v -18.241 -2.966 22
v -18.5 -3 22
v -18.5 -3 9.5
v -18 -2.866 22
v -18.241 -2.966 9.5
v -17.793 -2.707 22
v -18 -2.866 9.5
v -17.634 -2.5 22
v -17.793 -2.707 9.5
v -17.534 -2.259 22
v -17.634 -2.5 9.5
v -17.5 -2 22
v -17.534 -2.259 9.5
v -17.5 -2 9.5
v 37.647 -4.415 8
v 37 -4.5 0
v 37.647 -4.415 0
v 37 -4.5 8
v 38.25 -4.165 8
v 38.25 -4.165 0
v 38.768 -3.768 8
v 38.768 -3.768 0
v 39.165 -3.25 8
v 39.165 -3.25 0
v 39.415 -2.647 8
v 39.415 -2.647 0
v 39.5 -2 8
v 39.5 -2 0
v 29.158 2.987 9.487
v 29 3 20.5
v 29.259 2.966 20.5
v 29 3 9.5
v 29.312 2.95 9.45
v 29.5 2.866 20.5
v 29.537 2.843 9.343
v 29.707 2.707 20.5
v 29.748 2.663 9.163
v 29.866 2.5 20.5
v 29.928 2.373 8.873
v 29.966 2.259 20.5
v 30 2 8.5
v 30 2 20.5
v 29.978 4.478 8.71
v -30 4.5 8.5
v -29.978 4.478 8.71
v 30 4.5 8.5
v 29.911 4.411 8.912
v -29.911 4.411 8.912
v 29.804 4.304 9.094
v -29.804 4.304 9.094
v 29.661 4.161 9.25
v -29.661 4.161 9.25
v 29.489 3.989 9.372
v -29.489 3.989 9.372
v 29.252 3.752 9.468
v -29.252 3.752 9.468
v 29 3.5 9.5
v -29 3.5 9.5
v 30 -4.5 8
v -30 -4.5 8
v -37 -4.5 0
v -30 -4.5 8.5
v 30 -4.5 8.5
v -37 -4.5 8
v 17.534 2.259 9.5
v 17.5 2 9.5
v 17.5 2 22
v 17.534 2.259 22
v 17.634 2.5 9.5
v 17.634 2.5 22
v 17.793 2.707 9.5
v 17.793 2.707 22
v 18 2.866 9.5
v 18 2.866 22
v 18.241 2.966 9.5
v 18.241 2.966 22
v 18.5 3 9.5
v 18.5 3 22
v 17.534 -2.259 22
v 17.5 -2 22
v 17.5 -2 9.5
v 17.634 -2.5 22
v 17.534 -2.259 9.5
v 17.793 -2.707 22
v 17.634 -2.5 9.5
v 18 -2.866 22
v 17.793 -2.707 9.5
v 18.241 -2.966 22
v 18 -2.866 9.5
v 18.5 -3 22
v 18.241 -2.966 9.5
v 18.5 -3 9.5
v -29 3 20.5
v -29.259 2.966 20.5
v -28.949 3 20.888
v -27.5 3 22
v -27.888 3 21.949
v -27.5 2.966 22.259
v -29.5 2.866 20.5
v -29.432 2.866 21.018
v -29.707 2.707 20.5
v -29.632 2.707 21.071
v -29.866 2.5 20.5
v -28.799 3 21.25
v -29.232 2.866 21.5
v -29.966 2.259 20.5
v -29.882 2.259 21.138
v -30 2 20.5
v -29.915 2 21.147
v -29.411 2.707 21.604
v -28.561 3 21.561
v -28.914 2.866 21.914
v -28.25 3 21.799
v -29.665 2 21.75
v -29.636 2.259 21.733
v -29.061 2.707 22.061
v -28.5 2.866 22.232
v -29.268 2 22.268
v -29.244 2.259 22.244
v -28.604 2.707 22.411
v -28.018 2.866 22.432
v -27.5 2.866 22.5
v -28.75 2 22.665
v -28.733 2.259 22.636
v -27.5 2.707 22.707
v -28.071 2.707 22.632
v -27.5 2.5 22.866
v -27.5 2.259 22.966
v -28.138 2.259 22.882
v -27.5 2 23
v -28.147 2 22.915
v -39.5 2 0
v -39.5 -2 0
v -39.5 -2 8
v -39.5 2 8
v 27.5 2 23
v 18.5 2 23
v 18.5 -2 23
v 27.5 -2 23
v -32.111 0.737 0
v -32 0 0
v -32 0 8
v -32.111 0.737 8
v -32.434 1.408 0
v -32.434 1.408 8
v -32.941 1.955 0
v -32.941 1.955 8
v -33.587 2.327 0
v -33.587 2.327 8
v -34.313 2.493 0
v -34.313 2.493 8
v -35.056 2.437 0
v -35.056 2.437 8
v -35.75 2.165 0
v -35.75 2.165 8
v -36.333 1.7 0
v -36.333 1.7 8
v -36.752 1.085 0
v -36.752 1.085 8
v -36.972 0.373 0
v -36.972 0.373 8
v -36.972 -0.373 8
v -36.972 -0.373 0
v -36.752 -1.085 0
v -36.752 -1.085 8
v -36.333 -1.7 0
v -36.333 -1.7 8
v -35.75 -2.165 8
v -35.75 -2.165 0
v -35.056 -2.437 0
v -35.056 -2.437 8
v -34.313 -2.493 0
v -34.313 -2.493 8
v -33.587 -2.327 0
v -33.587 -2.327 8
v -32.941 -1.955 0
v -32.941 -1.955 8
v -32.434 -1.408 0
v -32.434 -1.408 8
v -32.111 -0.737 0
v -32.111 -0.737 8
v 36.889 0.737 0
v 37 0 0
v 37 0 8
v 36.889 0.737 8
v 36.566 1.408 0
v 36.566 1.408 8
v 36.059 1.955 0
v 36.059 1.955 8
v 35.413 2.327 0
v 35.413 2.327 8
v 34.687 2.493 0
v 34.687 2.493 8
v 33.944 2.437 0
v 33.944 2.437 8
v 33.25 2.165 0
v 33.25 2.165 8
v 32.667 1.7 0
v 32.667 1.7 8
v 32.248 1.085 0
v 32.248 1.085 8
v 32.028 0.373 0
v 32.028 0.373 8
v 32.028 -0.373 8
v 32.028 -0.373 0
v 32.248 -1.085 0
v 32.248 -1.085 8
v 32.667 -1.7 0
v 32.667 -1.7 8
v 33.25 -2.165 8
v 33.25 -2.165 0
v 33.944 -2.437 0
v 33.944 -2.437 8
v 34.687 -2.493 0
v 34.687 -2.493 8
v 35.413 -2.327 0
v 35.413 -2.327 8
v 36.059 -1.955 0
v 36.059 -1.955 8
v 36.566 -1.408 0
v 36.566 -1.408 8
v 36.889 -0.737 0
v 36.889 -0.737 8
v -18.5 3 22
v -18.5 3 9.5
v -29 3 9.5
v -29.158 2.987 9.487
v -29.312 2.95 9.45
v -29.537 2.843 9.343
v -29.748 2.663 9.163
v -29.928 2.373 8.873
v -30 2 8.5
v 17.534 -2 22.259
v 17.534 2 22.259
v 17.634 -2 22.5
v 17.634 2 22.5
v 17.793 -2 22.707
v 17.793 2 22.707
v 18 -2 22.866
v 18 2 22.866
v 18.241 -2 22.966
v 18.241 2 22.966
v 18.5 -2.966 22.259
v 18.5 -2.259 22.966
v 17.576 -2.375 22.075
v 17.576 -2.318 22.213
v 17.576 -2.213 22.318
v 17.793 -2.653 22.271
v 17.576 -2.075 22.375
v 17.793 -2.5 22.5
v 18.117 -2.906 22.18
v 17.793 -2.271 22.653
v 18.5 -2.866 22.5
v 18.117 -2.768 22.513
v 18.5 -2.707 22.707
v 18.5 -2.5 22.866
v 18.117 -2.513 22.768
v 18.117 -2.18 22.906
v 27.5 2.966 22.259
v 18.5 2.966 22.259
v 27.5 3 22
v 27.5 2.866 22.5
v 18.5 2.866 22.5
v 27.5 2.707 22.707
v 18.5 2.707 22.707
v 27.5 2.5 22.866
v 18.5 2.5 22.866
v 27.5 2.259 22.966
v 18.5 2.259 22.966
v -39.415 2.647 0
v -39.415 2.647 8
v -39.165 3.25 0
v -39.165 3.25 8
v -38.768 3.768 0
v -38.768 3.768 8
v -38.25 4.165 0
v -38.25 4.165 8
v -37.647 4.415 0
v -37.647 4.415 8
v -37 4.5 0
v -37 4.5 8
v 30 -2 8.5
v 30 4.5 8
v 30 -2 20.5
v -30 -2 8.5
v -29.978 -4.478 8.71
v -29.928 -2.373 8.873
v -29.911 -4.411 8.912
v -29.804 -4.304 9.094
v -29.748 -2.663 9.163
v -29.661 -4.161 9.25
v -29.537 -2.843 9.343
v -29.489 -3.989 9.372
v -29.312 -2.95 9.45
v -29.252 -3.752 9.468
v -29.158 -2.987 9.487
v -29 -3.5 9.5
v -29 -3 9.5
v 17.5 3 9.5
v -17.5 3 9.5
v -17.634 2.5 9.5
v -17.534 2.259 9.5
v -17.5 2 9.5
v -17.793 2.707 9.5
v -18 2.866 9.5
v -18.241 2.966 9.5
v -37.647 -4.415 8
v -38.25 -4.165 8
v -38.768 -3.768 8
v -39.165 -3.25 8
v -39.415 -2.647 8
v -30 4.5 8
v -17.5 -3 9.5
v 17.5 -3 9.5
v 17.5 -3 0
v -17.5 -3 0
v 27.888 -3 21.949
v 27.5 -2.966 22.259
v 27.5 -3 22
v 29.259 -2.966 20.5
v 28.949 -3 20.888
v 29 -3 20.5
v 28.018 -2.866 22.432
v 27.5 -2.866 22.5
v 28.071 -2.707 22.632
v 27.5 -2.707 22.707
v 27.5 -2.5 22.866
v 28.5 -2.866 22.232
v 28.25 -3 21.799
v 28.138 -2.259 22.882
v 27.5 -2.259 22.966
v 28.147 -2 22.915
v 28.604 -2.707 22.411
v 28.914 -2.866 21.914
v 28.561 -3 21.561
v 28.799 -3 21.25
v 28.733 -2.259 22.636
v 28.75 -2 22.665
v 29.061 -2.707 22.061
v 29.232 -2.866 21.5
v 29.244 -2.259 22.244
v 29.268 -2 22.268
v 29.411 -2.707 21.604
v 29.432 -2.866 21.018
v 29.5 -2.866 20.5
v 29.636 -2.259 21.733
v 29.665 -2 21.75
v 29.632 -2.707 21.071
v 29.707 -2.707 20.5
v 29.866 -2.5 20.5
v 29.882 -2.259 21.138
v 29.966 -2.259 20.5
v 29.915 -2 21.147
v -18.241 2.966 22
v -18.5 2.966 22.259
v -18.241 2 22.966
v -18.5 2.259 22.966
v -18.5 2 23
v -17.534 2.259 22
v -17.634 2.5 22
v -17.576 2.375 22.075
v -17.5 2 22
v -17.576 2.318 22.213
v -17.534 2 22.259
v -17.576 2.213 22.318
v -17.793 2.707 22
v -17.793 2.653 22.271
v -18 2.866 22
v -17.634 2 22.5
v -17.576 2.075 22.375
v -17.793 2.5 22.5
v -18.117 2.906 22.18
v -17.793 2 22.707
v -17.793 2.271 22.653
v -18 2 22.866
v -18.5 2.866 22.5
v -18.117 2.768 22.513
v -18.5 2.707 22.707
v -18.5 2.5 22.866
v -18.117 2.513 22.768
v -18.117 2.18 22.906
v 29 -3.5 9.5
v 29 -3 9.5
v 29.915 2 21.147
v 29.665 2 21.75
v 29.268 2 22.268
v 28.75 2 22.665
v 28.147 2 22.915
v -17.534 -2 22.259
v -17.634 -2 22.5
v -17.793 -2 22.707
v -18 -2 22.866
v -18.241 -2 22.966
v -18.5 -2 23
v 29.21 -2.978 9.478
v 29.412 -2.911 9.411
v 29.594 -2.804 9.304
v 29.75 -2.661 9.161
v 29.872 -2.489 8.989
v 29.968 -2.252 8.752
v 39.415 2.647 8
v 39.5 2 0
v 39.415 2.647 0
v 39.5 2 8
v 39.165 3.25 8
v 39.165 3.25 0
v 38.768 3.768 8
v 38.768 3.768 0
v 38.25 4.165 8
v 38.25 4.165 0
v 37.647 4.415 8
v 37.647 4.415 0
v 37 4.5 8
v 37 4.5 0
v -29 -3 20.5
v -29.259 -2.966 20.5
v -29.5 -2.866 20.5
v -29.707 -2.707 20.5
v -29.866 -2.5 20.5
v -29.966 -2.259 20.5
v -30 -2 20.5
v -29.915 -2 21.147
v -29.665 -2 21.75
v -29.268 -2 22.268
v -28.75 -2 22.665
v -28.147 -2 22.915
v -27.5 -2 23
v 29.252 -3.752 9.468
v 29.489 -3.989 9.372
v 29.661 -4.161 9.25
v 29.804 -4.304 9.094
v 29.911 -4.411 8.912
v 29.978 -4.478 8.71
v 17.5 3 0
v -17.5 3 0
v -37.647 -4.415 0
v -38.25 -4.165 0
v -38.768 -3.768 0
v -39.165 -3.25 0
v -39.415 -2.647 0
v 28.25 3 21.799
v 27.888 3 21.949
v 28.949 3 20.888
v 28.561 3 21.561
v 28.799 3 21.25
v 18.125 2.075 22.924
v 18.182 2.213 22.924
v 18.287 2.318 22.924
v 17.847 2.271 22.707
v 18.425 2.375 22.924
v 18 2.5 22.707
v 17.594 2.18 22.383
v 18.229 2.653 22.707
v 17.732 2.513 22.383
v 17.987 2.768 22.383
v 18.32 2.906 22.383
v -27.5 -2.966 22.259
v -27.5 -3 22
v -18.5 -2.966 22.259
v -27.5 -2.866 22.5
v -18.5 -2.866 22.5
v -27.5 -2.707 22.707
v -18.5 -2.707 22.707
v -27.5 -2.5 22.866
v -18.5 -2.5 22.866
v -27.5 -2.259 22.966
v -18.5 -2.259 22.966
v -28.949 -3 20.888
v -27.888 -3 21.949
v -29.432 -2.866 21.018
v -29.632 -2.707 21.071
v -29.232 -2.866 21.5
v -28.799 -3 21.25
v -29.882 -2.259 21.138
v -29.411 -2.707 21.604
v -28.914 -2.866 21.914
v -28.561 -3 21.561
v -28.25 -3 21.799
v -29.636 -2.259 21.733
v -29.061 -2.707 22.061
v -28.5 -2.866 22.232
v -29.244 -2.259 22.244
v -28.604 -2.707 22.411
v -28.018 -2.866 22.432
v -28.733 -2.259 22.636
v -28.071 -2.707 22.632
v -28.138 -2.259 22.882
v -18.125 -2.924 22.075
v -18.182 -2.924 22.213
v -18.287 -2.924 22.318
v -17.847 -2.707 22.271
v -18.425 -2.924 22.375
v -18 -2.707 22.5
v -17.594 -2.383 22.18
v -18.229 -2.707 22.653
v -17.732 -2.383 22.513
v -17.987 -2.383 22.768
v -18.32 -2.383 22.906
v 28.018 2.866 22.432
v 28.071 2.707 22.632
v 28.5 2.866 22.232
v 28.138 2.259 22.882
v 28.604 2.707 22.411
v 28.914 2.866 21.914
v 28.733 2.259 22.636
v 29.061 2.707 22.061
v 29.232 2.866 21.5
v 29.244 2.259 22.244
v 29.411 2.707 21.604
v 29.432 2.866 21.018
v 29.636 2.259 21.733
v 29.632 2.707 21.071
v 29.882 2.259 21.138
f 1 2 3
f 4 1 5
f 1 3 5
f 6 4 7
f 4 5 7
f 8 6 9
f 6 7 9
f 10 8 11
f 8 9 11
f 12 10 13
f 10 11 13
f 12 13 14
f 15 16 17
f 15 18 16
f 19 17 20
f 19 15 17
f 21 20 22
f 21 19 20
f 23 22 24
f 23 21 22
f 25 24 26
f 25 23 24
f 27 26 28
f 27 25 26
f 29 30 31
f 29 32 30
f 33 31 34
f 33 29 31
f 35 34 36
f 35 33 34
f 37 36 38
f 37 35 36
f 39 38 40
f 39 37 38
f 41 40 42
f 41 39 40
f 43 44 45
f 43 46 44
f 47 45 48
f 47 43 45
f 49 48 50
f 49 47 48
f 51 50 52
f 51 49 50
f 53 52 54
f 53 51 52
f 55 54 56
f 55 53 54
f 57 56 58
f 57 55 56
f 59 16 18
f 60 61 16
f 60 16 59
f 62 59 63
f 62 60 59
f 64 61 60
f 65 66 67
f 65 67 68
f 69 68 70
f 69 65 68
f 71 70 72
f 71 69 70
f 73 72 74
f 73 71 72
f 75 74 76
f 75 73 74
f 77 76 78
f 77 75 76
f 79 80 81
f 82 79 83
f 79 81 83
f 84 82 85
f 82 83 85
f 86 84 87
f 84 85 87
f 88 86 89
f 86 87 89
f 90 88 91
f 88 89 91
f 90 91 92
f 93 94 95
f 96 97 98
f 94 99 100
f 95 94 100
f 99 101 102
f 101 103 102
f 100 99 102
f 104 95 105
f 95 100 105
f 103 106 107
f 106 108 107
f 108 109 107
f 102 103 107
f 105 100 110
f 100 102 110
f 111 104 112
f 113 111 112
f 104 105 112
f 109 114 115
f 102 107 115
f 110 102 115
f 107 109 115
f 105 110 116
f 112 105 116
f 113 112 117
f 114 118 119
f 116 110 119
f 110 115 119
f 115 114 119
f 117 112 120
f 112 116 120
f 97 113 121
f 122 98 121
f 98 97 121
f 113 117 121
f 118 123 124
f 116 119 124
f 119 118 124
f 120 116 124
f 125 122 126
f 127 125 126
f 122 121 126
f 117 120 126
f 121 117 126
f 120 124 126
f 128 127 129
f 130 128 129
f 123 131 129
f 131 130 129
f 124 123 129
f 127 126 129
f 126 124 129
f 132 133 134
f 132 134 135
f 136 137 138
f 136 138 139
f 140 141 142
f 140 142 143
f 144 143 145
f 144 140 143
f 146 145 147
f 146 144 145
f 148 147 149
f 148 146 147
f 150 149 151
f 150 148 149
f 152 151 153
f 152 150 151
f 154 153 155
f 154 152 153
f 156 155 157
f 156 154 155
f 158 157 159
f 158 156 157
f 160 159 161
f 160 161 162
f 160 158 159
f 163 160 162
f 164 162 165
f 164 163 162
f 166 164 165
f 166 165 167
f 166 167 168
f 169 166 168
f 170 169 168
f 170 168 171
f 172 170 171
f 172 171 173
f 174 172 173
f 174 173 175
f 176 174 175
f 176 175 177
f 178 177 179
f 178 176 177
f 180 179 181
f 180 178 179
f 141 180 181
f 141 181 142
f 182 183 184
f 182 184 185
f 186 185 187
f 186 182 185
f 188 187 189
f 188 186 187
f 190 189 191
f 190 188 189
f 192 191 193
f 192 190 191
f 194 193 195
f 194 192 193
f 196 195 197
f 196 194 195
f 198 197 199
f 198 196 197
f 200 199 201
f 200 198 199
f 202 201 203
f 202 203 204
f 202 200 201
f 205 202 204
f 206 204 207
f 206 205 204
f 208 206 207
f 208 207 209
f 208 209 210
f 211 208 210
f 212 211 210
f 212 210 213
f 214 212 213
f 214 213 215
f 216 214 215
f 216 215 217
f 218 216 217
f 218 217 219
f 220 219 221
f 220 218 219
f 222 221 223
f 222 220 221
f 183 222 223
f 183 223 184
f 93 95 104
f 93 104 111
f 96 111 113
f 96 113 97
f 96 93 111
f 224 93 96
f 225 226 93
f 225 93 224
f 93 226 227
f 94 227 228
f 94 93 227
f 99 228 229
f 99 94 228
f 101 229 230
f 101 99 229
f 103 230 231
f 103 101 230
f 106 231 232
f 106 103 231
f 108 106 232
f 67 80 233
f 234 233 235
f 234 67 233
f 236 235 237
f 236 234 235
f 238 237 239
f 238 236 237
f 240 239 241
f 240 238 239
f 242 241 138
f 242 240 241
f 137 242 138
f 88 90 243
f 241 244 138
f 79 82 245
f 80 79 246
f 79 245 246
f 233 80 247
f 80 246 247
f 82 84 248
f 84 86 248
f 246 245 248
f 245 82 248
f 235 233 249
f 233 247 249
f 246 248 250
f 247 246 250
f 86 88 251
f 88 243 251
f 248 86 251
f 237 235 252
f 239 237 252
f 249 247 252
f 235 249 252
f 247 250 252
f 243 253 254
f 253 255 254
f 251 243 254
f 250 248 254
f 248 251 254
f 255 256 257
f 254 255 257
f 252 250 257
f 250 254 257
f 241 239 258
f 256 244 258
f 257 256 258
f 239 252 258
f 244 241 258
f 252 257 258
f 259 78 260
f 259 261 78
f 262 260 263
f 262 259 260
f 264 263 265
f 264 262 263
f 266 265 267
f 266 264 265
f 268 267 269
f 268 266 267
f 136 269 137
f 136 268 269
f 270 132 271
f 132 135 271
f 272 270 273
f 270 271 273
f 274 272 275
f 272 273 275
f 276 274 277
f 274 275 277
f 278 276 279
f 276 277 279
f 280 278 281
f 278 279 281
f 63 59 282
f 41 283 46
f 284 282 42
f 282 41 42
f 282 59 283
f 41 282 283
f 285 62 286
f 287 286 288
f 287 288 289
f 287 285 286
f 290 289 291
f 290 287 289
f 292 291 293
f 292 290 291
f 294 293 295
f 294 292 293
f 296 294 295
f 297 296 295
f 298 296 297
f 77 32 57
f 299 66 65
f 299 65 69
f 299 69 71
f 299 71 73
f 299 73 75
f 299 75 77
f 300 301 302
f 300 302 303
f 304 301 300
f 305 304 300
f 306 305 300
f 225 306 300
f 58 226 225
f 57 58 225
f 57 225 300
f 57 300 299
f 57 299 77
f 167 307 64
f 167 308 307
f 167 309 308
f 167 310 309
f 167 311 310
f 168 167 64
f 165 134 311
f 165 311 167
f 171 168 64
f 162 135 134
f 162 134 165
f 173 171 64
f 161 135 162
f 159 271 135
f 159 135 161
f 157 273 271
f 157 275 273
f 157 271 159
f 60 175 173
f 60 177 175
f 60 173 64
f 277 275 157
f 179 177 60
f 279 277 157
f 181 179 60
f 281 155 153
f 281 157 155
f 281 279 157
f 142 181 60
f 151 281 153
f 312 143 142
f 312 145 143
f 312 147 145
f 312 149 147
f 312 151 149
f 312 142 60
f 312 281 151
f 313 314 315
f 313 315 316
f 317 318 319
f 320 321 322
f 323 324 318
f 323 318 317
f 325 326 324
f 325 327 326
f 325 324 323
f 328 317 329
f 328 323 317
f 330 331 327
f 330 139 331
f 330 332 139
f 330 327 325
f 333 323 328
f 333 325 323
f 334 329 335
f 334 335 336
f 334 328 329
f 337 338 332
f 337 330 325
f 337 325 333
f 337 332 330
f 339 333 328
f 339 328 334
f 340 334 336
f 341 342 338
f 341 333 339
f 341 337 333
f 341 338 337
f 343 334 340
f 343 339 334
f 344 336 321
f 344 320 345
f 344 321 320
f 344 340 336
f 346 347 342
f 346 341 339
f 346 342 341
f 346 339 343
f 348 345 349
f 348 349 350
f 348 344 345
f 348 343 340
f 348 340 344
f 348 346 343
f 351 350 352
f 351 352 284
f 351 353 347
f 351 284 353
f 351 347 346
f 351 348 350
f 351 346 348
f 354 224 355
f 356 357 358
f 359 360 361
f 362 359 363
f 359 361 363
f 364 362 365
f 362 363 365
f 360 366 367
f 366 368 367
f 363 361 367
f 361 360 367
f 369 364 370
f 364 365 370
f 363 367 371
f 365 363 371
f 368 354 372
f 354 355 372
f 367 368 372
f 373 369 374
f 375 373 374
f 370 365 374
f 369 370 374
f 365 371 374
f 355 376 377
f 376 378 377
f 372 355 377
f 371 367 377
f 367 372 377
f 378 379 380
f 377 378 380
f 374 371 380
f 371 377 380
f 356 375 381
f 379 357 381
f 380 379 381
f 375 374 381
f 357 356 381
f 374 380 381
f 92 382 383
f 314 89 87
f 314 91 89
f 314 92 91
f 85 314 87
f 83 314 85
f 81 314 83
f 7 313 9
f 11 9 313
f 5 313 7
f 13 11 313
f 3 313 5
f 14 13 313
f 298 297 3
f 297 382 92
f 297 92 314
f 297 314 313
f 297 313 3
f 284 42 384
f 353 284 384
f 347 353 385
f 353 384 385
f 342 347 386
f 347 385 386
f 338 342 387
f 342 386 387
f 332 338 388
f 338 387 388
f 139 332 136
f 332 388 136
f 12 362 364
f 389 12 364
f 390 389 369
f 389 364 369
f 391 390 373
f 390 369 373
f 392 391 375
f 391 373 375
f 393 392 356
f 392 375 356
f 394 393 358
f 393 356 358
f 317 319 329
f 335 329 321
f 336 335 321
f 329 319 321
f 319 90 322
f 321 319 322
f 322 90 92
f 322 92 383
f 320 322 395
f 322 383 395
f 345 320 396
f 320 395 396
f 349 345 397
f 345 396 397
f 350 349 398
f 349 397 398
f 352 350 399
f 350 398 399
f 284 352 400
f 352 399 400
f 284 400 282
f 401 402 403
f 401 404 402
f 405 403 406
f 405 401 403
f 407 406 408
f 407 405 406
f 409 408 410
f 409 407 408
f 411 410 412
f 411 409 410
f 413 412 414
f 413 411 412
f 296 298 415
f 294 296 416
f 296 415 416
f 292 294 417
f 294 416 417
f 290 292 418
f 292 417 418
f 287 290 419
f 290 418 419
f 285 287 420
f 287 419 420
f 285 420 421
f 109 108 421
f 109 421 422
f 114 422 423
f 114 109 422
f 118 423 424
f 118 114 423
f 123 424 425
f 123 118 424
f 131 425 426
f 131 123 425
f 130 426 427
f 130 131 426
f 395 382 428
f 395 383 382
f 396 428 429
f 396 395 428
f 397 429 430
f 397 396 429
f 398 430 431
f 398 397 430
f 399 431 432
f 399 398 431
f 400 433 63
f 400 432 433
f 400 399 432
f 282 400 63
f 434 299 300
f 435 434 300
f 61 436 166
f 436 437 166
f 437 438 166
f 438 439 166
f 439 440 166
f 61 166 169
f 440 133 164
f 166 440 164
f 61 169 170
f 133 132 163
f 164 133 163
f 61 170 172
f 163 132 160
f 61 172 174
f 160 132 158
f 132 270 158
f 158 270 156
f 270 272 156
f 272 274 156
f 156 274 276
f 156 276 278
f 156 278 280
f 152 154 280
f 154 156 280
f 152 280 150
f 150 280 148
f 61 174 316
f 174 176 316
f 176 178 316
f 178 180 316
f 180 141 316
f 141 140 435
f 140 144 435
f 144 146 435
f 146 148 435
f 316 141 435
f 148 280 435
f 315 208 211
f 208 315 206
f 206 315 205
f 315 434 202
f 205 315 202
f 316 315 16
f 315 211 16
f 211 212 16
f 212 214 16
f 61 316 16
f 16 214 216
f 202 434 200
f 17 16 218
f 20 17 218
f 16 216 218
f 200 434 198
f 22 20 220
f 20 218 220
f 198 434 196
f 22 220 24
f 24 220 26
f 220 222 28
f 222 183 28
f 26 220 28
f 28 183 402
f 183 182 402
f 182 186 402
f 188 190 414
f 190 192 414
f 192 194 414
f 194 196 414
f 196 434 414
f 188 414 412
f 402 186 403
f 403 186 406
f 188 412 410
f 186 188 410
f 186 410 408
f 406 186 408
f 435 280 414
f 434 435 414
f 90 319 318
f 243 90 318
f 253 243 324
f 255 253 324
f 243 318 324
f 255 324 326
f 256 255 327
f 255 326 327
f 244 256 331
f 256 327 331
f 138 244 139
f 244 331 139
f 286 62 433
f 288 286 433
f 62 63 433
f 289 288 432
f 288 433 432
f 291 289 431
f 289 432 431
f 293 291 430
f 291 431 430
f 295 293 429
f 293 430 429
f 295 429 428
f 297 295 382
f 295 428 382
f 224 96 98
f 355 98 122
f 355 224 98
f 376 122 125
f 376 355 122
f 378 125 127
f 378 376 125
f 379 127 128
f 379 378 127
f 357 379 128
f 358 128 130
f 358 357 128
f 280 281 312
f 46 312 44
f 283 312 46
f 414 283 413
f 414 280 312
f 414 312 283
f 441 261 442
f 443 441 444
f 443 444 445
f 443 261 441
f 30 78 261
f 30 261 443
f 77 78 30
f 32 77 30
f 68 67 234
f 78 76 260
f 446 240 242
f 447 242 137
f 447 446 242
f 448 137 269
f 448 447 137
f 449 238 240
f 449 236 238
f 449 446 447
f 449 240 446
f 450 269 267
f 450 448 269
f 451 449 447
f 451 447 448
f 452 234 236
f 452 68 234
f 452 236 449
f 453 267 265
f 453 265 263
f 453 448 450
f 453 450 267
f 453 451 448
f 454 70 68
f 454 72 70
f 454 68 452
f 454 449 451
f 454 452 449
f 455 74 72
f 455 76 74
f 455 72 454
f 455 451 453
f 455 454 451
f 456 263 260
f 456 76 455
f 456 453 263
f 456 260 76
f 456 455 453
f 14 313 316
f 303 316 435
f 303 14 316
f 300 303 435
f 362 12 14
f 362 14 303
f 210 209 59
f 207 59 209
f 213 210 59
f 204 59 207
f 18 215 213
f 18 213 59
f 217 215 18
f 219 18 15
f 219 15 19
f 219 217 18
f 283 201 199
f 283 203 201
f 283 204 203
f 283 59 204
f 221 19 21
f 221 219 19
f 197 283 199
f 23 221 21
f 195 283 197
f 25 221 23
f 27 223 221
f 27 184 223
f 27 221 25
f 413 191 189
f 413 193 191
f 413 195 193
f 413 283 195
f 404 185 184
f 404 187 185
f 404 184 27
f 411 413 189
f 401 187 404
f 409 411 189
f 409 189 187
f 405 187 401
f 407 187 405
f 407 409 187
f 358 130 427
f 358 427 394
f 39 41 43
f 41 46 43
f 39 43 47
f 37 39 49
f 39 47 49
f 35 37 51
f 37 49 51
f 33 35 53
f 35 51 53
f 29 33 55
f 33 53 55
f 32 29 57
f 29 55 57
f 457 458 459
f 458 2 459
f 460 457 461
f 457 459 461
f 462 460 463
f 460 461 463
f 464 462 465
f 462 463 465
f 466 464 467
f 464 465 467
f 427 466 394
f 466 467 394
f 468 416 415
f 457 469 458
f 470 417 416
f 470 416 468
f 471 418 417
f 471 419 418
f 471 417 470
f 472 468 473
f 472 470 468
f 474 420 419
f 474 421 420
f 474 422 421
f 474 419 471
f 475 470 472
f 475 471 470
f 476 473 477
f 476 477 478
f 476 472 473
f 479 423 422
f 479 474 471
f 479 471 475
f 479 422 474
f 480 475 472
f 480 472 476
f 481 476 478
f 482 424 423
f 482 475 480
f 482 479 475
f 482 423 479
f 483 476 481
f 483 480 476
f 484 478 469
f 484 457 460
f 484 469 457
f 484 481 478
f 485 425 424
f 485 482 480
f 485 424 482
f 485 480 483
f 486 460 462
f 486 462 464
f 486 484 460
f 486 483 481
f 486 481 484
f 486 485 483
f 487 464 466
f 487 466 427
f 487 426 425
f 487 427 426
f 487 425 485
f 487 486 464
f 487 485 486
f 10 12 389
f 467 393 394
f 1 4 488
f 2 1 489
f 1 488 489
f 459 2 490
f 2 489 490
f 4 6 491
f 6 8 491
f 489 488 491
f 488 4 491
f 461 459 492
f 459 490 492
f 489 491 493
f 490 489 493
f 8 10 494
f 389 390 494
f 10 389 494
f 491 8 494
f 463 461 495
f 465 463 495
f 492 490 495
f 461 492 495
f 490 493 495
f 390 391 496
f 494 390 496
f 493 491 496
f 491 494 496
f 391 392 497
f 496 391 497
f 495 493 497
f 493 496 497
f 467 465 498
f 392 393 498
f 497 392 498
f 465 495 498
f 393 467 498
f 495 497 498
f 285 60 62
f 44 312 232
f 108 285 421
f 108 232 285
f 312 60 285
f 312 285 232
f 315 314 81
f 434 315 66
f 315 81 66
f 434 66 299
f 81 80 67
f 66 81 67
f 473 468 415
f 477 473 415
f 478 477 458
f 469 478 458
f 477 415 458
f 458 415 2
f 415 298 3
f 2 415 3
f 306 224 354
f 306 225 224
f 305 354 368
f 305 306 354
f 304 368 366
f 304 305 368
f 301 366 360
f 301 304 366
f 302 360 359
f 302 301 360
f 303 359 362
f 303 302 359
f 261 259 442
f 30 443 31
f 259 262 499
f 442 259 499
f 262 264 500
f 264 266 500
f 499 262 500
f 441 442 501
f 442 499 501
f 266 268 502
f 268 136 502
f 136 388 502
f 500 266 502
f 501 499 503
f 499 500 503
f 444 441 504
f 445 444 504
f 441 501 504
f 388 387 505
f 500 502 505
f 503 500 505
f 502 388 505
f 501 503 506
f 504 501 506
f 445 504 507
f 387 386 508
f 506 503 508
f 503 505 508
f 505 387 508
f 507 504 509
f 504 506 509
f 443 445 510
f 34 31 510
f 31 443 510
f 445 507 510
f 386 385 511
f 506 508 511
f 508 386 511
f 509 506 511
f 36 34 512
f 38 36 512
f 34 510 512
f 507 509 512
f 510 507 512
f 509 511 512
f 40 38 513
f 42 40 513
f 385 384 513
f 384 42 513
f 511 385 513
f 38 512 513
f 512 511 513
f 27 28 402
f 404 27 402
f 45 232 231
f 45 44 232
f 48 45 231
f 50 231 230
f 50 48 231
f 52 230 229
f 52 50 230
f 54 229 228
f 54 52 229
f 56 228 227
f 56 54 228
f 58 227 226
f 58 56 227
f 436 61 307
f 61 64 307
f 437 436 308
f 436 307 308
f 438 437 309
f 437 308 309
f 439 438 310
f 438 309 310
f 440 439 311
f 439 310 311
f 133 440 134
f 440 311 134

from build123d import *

# Parameters (mm, degrees)
SKETCH1_W           = 79
SKETCH1_H           = 9
SKETCH1_R           = 2.5
BOSS_EXTRUDE1_DEPTH = 8
SKETCH2_W           = 60
SKETCH2_H           = 6
BOSS_EXTRUDE2_DEPTH = 15
SKETCH3_W           = 1.5
SKETCH3_H           = 1.5
BOSS_EXTRUDE3_DEPTH = 60
SKETCH4_W           = 35
SKETCH4_H           = 6
CUT_EXTRUDE1_DEPTH  = 23
FILLET1_R           = 2.5
FILLET2_R           = 1


with BuildPart() as part:
    # Sketch1 → Boss-Extrude1 (new body)
    with BuildSketch(Plane.XY):
        Rectangle(SKETCH1_W, SKETCH1_H)
        with Locations((-34.5, 0)):
            Circle(SKETCH1_R, mode=Mode.SUBTRACT)
        with Locations((34.5, 0)):
            Circle(SKETCH1_R, mode=Mode.SUBTRACT)
    extrude(amount=BOSS_EXTRUDE1_DEPTH)

    # Sketch2 → Boss-Extrude2 (add)
    with BuildSketch(Plane.XY.offset(8)):
        Rectangle(SKETCH2_W, SKETCH2_H)
    extrude(amount=BOSS_EXTRUDE2_DEPTH)

    # Sketch3 → Boss-Extrude3 (add)
    with BuildSketch(Plane.ZY.offset(30)):
        with Locations((8.75, -3.75)):
            Rectangle(SKETCH3_W, SKETCH3_H)
        with Locations((8.75, 3.75)):
            Rectangle(SKETCH3_W, SKETCH3_H)
    extrude(amount=-BOSS_EXTRUDE3_DEPTH)

    # Sketch4 → Cut-Extrude1 (cut)
    with BuildSketch(Plane(origin=(0, 0, 23), x_dir=(-1, 0, 0), z_dir=(0, 0, -1))):
        Rectangle(SKETCH4_W, SKETCH4_H)
    extrude(amount=CUT_EXTRUDE1_DEPTH, mode=Mode.SUBTRACT)

    # Fillet1
    fillet1_edges = [part.edges().sort_by_distance(p)[0] for p in [
        (39.5, -4.5, 4),
        (-39.5, -4.5, 4),
        (-39.5, 4.5, 4),
        (39.5, 4.5, 4),
        (30, 0, 23),
        (-30, 0, 23),
    ]]
    fillet(fillet1_edges, radius=FILLET1_R)

    # Fillet2
    fillet2_edges = [part.edges().sort_by_distance(p)[0] for p in [
        (0, 4.5, 9.5),
        (-30, 3.75, 9.5),
        (30, 3.75, 9.5),
        (0, -4.5, 9.5),
        (-30, -3.75, 9.5),
        (30, -3.75, 9.5),
        (-22.5, 3, 23),
        (22.5, -3, 23),
        (-17.5, 3, 16.25),
        (17.5, -3, 16.25),
        (-17.5, 0, 23),
        (17.5, 3, 16.25),
        (17.5, 0, 23),
        (-17.5, -3, 16.25),
        (22.5, 3, 23),
        (30, 3, 15),
        (29.267766953, 3, 22.267766953),
        (30, -3, 15),
        (29.267766953, -3, 22.267766953),
        (-22.5, -3, 23),
        (-30, -3, 15),
        (-29.267766953, -3, 22.267766953),
        (-30, 3, 15),
        (-29.267766953, 3, 22.267766953),
    ]]
    fillet(fillet2_edges, radius=FILLET2_R)


solid = part.part
